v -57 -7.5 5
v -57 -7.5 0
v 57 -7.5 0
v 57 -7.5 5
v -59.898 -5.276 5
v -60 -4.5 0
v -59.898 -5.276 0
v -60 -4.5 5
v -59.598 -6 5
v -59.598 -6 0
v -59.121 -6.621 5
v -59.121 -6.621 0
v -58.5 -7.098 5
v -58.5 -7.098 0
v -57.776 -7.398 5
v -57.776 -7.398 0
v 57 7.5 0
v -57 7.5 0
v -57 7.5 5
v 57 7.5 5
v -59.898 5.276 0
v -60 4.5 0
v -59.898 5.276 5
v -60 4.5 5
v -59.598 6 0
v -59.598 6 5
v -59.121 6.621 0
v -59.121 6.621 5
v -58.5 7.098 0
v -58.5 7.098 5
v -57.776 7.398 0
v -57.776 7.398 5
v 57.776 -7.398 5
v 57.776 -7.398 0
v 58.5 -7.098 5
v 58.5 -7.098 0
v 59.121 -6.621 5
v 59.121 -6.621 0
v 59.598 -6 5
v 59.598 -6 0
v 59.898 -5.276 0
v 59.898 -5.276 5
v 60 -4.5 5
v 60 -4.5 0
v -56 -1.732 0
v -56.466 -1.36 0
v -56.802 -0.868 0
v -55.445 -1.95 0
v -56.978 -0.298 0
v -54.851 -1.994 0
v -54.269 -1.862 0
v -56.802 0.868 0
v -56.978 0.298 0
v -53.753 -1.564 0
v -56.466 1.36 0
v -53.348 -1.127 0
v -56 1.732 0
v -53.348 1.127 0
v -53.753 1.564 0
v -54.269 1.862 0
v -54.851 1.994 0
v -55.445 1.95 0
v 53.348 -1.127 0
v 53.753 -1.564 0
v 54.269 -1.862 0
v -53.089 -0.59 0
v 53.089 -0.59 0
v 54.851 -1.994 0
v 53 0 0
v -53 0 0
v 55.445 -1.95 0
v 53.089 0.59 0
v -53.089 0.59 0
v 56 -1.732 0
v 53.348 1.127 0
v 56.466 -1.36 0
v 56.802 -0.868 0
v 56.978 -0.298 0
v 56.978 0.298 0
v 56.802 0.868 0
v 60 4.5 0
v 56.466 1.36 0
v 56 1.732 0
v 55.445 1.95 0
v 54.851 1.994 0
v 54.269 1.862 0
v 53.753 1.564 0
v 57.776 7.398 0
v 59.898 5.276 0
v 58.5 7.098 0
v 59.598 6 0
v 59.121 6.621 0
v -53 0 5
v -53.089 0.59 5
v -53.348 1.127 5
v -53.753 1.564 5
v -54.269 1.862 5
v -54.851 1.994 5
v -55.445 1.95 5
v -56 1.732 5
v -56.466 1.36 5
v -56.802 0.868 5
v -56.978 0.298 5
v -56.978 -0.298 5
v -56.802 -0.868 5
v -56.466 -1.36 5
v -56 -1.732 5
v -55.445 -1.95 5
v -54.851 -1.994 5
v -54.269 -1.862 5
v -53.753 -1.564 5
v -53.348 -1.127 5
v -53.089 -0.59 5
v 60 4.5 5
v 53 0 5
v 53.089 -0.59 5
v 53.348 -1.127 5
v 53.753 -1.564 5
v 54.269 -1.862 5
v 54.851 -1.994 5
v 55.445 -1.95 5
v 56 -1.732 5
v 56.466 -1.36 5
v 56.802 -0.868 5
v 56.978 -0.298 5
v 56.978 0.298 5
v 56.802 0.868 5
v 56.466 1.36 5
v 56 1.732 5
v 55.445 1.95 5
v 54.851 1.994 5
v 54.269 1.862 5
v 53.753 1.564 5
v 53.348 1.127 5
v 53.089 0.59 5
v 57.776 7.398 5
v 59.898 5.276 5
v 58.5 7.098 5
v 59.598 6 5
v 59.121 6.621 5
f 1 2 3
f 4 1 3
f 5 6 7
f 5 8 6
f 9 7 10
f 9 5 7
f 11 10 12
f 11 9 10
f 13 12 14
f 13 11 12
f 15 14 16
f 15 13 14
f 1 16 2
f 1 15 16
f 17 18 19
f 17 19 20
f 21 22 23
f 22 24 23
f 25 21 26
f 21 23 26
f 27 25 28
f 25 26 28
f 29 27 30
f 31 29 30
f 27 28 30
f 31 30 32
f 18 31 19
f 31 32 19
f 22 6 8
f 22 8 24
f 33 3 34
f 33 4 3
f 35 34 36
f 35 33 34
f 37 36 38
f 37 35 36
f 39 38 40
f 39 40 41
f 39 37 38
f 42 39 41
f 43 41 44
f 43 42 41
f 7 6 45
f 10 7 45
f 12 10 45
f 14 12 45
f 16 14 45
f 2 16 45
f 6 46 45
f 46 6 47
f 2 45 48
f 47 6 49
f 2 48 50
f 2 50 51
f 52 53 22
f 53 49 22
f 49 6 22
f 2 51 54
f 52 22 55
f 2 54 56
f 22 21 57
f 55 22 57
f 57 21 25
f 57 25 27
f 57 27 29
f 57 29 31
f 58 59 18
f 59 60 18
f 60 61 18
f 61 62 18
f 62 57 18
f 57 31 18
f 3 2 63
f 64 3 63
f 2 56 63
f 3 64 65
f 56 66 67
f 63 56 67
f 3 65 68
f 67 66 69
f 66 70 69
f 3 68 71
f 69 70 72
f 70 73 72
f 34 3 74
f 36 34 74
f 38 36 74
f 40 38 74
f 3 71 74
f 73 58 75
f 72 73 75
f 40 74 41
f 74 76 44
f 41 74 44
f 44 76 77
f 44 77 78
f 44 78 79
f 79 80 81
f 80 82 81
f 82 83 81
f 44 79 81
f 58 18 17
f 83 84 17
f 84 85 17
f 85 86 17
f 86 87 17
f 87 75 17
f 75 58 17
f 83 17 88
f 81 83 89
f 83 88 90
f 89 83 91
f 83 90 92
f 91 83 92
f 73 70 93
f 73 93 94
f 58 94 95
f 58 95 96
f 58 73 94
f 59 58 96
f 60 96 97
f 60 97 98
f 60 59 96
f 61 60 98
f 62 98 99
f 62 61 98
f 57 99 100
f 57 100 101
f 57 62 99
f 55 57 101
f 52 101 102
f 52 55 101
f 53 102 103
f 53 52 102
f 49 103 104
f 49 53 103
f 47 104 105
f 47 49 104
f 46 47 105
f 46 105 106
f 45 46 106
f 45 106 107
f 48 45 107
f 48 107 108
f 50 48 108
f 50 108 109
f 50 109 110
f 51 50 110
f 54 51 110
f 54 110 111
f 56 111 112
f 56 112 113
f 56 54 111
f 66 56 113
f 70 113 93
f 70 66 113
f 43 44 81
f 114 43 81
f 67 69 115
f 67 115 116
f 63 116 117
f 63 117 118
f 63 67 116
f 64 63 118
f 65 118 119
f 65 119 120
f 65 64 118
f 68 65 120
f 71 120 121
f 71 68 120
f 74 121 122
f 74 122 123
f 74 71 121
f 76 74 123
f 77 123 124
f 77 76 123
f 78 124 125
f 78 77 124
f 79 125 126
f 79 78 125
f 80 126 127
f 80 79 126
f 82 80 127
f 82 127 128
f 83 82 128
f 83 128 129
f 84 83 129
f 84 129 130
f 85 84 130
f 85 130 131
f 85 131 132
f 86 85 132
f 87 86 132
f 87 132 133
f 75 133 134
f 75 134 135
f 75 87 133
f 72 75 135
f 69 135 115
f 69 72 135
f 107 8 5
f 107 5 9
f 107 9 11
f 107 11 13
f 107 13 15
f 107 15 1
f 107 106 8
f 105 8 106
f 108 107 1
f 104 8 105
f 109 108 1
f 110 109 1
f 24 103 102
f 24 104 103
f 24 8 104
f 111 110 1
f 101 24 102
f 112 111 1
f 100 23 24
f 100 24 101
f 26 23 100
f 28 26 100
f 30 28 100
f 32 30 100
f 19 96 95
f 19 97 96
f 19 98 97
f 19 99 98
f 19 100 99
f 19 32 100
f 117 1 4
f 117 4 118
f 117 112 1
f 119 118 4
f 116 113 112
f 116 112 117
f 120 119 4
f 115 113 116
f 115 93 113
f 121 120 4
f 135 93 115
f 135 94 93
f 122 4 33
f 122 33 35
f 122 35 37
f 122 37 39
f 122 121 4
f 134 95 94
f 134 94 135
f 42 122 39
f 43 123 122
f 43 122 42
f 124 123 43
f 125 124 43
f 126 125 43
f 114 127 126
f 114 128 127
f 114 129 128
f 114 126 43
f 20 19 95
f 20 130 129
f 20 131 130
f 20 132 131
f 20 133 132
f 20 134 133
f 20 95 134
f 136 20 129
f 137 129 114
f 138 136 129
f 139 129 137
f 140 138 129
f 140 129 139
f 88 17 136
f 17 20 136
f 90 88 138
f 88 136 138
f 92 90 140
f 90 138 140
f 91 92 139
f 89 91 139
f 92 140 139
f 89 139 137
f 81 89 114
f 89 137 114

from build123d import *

# Parameters (mm, degrees)
ESQUISSE1_W        = 120
ESQUISSE1_H        = 15
ESQUISSE1_R        = 2
BOSS_EXTRU_1_DEPTH = 5
CONG_1_R           = 3


with BuildPart() as part:
    # Esquisse1 → Boss.-Extru.1 (new body)
    with BuildSketch(Plane.XY):
        Rectangle(ESQUISSE1_W, ESQUISSE1_H)
        with Locations((-55, 0)):
            Circle(ESQUISSE1_R, mode=Mode.SUBTRACT)
        with Locations(Location((55, 0, 0), (0, 0, 180))):
            Circle(ESQUISSE1_R, mode=Mode.SUBTRACT)
    extrude(amount=BOSS_EXTRU_1_DEPTH)

    # Congé1
    cong_1_edges = [part.edges().sort_by_distance(p)[0] for p in [
        (60, -7.5, 2.5),
        (-60, -7.5, 2.5),
        (-60, 7.5, 2.5),
        (60, 7.5, 2.5),
    ]]
    fillet(cong_1_edges, radius=CONG_1_R)


solid = part.part
